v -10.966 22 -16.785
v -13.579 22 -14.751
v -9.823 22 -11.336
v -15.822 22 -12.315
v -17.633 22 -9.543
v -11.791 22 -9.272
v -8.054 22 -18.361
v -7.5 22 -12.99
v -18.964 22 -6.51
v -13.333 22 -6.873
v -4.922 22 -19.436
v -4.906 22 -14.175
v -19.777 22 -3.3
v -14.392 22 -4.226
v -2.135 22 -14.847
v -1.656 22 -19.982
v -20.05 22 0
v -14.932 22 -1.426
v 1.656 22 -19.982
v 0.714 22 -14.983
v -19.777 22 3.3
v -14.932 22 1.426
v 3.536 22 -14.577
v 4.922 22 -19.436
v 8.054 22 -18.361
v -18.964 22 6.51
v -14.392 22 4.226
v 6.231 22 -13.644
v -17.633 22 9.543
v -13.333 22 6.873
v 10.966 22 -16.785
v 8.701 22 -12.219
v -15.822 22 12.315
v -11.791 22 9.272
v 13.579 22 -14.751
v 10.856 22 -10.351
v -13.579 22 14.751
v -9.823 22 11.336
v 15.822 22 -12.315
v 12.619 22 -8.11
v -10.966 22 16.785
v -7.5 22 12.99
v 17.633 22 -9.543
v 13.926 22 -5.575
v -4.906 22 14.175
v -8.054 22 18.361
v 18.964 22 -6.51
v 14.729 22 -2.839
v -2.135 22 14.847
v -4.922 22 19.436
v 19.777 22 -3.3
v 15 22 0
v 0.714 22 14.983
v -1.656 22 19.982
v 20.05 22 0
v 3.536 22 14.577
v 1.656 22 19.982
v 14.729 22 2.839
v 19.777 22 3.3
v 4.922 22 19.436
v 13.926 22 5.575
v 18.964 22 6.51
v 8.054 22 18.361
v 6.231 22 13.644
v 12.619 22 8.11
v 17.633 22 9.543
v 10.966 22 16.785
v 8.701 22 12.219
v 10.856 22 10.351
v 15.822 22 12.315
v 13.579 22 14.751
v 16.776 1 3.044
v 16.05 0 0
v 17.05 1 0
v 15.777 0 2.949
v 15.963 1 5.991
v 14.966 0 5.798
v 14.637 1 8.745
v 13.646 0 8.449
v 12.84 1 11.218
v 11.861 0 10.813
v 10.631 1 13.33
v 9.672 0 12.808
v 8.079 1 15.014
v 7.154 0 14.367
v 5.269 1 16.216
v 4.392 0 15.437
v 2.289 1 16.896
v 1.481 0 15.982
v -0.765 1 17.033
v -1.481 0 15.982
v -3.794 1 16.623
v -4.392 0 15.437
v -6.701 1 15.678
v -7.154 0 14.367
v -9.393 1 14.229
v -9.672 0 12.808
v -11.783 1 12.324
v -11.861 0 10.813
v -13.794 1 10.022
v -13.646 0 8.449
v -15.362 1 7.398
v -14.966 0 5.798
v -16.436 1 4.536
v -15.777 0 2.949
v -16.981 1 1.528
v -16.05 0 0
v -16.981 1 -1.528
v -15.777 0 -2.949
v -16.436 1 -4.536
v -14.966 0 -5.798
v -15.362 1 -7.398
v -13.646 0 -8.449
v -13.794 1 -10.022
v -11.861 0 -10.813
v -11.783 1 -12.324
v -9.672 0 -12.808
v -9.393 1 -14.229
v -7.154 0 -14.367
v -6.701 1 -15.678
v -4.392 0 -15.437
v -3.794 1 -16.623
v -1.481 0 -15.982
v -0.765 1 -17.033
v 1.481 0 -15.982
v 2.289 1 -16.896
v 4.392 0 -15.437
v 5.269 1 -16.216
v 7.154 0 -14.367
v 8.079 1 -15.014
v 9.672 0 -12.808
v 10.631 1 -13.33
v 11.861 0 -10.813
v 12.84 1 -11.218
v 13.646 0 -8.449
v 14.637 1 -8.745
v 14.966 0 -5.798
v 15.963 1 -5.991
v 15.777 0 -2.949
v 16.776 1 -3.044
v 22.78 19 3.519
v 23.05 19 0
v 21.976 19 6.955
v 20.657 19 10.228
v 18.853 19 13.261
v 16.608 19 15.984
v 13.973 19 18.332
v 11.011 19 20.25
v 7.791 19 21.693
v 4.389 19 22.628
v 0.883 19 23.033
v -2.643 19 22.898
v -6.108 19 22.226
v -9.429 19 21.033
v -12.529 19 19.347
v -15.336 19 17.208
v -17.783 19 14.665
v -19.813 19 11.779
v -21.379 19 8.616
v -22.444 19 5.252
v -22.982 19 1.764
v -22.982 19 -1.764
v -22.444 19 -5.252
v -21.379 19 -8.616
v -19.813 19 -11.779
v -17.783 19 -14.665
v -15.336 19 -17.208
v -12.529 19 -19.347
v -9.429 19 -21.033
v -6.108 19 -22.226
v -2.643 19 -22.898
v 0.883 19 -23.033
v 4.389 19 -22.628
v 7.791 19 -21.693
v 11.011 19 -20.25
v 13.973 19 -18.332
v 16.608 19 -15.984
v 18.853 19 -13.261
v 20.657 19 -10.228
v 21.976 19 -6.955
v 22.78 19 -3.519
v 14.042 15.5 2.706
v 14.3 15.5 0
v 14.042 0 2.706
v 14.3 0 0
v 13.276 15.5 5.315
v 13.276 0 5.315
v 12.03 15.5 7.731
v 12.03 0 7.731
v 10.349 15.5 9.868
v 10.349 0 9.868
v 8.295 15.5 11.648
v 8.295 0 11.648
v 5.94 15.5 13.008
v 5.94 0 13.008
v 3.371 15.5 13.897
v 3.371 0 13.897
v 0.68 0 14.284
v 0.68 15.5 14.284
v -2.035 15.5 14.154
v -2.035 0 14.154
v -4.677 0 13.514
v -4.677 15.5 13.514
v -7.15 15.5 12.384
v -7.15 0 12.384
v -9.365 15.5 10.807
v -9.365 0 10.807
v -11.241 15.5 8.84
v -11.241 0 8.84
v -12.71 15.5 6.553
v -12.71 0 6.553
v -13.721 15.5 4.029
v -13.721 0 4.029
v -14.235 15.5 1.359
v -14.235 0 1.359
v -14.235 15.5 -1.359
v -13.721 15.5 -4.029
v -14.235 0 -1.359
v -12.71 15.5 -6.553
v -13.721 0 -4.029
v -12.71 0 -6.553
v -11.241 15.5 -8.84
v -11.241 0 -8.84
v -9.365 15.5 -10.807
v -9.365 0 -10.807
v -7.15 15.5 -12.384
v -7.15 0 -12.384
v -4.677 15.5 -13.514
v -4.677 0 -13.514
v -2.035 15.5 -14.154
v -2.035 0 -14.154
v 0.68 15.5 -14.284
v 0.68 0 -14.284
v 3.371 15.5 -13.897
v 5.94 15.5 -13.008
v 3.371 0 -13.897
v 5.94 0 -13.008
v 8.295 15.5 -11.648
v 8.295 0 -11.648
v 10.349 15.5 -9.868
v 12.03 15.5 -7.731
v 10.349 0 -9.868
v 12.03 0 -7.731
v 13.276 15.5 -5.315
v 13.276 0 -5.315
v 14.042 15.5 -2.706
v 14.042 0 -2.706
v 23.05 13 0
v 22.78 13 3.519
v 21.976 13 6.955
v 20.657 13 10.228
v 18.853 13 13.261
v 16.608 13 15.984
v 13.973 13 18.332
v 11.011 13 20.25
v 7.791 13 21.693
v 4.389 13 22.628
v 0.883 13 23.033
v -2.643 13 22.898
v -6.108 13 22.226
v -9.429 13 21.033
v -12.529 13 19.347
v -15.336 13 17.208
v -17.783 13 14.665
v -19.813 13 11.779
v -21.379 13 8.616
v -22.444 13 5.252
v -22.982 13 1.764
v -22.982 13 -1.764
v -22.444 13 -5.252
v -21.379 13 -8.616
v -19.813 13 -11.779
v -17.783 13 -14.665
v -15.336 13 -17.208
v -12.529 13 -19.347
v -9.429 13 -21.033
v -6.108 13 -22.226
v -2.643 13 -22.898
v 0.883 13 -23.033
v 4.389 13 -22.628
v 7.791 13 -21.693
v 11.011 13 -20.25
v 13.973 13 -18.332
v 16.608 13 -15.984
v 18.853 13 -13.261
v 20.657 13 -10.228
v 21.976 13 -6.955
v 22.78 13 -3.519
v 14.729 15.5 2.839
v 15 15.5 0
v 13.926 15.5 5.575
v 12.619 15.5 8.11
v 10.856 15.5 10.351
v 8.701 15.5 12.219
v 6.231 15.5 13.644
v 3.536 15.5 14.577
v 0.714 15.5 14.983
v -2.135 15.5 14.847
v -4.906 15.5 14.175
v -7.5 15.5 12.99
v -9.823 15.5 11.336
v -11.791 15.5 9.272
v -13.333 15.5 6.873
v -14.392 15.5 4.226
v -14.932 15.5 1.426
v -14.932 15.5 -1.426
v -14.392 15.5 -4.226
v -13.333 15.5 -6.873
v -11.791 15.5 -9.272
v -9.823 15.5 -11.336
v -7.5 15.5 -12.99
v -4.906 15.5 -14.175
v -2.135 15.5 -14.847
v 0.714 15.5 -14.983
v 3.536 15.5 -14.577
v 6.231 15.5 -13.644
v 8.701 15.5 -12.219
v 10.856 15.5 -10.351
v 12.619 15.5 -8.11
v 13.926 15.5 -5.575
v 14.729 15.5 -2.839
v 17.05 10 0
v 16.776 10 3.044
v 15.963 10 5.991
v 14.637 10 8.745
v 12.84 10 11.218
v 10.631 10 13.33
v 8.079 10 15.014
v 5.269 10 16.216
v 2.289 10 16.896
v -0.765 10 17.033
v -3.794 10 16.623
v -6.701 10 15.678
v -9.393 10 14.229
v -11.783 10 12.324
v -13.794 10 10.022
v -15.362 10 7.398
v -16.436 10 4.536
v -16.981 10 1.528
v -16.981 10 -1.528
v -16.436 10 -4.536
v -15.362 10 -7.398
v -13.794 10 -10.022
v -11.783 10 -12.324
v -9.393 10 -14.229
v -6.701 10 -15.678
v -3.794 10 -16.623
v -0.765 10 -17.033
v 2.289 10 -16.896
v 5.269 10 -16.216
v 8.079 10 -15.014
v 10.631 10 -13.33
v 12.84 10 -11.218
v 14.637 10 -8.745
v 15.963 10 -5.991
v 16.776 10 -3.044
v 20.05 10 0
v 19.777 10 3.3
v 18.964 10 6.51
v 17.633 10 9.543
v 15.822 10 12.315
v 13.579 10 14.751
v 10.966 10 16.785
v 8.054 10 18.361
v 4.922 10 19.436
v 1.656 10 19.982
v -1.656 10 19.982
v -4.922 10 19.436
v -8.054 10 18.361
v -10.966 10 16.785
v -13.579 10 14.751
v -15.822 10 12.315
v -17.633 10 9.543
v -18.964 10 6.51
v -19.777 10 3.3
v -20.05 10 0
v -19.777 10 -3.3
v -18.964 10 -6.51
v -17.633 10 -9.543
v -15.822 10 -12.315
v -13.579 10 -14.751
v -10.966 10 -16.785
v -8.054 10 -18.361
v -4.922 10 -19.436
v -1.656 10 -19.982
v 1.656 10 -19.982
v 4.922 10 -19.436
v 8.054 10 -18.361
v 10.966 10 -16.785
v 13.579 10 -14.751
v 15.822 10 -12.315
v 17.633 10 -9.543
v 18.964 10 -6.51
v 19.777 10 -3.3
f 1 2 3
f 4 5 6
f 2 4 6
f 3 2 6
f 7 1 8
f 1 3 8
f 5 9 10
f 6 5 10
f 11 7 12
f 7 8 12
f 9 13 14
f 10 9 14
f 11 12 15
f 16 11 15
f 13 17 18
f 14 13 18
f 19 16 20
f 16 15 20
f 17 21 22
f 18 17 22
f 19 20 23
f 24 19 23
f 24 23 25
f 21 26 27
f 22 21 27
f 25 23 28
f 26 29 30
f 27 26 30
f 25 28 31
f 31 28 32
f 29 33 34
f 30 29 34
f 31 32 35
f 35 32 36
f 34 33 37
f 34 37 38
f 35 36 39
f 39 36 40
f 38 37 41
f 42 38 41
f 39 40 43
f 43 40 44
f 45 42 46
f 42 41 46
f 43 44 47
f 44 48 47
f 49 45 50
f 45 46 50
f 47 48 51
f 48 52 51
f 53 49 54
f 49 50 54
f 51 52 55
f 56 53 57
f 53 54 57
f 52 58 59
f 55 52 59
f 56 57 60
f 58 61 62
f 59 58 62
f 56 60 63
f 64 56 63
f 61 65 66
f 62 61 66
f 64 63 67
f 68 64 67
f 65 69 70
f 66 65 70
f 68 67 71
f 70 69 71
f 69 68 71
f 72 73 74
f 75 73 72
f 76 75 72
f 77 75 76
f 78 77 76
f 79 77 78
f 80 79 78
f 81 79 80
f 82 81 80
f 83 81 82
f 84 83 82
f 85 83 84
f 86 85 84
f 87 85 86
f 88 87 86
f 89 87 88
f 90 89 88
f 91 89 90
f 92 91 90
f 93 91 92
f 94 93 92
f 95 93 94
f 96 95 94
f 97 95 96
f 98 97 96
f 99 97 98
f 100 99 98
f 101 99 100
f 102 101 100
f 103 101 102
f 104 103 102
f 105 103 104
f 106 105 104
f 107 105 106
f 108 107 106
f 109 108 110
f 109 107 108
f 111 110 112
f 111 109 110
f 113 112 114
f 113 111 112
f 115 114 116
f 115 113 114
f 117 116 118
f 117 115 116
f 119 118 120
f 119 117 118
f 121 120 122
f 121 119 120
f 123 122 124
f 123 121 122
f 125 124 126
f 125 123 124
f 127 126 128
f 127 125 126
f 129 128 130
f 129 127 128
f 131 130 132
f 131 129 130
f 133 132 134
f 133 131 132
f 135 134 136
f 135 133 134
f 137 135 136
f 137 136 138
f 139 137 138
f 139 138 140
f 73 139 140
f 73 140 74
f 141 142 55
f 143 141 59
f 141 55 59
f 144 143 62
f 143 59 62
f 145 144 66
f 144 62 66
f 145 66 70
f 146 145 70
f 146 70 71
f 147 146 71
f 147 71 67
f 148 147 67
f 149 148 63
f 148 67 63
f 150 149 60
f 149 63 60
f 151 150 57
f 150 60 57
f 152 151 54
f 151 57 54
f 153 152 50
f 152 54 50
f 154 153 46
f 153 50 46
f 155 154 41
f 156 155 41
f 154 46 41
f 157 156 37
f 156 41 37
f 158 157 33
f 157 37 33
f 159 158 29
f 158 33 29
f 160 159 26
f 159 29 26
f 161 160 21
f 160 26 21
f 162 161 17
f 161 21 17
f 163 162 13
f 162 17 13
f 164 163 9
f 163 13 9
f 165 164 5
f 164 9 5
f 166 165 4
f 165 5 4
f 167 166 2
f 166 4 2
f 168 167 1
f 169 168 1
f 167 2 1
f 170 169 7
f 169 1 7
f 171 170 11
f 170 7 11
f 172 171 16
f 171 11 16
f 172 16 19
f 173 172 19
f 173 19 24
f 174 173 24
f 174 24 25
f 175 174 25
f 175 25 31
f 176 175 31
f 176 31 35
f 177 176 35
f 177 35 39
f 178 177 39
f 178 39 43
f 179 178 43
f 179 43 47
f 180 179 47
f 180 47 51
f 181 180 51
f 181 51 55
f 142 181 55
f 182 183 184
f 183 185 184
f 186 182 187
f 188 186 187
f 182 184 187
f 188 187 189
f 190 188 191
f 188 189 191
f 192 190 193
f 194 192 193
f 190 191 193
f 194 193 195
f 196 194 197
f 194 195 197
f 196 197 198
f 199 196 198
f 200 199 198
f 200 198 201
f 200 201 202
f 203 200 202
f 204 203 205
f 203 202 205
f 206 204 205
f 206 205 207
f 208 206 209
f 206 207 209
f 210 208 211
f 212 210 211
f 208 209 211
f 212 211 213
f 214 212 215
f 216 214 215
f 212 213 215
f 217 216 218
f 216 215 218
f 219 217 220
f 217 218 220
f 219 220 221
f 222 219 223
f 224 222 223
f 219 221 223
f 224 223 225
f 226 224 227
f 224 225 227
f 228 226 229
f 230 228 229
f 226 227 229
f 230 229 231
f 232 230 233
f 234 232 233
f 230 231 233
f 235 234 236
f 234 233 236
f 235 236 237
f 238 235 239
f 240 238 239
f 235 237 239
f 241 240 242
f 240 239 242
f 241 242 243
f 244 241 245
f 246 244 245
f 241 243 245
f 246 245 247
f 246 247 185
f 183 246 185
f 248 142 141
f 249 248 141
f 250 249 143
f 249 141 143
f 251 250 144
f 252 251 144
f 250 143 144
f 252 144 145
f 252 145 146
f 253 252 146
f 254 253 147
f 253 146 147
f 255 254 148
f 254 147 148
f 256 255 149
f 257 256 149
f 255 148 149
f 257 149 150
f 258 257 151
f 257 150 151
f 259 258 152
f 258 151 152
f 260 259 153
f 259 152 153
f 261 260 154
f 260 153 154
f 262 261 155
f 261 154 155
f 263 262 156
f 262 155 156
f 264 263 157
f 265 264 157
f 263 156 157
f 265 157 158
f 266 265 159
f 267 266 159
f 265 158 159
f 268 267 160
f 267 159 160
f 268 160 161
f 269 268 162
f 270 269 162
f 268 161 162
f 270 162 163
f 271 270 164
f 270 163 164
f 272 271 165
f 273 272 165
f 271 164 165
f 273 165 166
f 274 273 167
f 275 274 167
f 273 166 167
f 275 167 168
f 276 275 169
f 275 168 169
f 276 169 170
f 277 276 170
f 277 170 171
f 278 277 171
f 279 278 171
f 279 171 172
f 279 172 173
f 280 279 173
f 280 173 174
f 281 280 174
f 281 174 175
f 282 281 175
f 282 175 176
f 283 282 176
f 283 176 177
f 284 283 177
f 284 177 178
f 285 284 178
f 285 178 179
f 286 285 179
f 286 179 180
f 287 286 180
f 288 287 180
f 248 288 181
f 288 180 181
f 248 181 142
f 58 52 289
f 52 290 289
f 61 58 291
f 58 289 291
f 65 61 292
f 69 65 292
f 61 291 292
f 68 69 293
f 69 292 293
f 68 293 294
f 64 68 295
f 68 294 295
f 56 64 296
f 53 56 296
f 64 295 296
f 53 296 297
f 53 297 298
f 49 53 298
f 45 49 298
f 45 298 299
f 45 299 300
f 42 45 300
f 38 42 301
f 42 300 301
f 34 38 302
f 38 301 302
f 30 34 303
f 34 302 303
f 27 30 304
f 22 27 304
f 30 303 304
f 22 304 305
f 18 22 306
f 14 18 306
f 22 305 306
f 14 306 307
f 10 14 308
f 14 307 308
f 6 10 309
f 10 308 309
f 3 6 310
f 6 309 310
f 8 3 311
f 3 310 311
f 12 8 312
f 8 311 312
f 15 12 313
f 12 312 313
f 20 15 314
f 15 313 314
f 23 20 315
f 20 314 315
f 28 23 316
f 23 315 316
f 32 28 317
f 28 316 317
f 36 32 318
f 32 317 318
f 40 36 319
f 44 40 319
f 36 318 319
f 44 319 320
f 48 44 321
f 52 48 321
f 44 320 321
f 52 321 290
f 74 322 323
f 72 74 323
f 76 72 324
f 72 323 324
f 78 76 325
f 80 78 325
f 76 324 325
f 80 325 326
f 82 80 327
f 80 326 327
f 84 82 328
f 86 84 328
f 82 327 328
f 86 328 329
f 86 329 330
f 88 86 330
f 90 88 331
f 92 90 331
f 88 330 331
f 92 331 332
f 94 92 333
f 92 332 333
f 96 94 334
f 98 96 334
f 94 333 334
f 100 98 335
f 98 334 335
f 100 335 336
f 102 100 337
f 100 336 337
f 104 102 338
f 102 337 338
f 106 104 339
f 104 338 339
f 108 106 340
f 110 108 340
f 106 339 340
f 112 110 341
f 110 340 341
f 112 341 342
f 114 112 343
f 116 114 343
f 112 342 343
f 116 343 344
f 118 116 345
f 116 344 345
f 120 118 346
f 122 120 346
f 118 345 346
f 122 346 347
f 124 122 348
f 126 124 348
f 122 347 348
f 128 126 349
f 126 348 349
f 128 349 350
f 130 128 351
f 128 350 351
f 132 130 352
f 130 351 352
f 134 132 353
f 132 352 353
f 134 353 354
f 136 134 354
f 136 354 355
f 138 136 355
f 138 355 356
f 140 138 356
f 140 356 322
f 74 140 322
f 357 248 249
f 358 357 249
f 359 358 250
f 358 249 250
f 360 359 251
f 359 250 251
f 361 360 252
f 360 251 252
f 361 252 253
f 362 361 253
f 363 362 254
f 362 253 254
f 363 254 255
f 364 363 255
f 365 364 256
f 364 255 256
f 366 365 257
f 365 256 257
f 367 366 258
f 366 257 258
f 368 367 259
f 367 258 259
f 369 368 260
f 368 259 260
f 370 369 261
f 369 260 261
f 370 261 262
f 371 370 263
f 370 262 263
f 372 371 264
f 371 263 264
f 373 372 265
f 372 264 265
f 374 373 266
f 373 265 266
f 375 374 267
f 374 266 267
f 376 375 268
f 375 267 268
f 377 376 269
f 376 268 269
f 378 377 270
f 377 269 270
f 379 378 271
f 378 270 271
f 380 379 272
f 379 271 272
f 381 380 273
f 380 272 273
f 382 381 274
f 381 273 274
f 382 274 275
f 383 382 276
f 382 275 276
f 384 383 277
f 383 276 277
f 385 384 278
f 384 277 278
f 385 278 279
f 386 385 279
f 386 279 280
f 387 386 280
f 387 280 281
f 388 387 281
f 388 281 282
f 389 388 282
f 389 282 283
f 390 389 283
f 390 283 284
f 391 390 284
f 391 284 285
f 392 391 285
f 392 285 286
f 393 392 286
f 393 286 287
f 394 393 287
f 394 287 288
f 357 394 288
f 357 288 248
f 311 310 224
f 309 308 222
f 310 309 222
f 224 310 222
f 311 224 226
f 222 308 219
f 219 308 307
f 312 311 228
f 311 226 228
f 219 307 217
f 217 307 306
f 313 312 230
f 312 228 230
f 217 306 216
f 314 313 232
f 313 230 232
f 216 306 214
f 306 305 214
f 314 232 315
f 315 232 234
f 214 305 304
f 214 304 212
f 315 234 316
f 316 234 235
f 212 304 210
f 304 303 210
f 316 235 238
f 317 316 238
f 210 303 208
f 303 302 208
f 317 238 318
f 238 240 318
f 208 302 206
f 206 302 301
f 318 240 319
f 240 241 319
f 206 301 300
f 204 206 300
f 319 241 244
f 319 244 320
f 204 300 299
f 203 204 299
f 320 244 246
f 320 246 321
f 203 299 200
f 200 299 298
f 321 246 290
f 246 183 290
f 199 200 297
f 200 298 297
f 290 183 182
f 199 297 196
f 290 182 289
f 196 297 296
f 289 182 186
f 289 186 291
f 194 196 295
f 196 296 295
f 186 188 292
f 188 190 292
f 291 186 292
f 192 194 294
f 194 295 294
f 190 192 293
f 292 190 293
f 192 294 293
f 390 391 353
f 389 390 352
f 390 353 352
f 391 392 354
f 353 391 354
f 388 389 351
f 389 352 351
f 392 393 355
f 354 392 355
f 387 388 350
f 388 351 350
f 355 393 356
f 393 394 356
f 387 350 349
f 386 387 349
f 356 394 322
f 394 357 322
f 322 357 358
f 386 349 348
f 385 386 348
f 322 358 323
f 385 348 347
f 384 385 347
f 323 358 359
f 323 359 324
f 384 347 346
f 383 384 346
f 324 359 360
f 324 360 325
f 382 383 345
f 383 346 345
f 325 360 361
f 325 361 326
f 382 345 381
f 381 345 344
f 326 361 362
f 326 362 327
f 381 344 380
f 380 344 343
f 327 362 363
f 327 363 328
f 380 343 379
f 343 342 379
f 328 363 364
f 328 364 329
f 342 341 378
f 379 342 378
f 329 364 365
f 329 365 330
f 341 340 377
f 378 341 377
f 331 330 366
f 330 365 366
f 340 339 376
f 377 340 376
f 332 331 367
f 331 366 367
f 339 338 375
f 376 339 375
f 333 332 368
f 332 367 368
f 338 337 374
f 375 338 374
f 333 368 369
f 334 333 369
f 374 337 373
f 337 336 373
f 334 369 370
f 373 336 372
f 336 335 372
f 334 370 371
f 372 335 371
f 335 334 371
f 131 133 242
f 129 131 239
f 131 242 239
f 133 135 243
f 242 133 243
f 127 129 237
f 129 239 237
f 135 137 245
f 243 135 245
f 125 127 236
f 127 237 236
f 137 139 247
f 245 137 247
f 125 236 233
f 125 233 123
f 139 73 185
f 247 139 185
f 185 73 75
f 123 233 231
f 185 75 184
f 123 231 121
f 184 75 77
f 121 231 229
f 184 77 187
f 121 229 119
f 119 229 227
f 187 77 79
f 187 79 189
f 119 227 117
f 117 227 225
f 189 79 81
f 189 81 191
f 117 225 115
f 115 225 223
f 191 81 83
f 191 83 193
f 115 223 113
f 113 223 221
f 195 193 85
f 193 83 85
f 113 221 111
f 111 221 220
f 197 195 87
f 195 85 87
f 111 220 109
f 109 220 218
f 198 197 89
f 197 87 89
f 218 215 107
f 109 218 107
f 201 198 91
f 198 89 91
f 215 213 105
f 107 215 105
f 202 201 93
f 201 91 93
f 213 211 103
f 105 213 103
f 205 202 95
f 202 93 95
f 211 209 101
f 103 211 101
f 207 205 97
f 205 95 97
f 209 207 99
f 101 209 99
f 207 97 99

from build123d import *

# Parameters (mm, degrees)
CHAMFER1_SIZE = 3
CHAMFER2_SIZE = 1


with BuildPart() as part:
    # Sketch1 → Revolve1 (revolve)
    with BuildSketch(Plane.XY):
        Polygon((14.3, 0), (17.05, 0), (17.05, 10), (23.05, 10), (23.05, 22), (15, 22), (15, 15.5), (14.3, 15.5), align=None)
    revolve(axis=Axis((0, 23.1, 0), (0, -1, 0)))

    # Chamfer1
    chamfer1_edges = [part.edges().sort_by_distance(p)[0] for p in [
        (-23.05, 22, 0),
        (-23.05, 10, 0),
    ]]
    chamfer(chamfer1_edges, length=CHAMFER1_SIZE)

    # Chamfer2
    chamfer2_edges = [part.edges().sort_by_distance(p)[0] for p in [
        (-17.05, 0, 0),
    ]]
    chamfer(chamfer2_edges, length=CHAMFER2_SIZE)


solid = part.part
